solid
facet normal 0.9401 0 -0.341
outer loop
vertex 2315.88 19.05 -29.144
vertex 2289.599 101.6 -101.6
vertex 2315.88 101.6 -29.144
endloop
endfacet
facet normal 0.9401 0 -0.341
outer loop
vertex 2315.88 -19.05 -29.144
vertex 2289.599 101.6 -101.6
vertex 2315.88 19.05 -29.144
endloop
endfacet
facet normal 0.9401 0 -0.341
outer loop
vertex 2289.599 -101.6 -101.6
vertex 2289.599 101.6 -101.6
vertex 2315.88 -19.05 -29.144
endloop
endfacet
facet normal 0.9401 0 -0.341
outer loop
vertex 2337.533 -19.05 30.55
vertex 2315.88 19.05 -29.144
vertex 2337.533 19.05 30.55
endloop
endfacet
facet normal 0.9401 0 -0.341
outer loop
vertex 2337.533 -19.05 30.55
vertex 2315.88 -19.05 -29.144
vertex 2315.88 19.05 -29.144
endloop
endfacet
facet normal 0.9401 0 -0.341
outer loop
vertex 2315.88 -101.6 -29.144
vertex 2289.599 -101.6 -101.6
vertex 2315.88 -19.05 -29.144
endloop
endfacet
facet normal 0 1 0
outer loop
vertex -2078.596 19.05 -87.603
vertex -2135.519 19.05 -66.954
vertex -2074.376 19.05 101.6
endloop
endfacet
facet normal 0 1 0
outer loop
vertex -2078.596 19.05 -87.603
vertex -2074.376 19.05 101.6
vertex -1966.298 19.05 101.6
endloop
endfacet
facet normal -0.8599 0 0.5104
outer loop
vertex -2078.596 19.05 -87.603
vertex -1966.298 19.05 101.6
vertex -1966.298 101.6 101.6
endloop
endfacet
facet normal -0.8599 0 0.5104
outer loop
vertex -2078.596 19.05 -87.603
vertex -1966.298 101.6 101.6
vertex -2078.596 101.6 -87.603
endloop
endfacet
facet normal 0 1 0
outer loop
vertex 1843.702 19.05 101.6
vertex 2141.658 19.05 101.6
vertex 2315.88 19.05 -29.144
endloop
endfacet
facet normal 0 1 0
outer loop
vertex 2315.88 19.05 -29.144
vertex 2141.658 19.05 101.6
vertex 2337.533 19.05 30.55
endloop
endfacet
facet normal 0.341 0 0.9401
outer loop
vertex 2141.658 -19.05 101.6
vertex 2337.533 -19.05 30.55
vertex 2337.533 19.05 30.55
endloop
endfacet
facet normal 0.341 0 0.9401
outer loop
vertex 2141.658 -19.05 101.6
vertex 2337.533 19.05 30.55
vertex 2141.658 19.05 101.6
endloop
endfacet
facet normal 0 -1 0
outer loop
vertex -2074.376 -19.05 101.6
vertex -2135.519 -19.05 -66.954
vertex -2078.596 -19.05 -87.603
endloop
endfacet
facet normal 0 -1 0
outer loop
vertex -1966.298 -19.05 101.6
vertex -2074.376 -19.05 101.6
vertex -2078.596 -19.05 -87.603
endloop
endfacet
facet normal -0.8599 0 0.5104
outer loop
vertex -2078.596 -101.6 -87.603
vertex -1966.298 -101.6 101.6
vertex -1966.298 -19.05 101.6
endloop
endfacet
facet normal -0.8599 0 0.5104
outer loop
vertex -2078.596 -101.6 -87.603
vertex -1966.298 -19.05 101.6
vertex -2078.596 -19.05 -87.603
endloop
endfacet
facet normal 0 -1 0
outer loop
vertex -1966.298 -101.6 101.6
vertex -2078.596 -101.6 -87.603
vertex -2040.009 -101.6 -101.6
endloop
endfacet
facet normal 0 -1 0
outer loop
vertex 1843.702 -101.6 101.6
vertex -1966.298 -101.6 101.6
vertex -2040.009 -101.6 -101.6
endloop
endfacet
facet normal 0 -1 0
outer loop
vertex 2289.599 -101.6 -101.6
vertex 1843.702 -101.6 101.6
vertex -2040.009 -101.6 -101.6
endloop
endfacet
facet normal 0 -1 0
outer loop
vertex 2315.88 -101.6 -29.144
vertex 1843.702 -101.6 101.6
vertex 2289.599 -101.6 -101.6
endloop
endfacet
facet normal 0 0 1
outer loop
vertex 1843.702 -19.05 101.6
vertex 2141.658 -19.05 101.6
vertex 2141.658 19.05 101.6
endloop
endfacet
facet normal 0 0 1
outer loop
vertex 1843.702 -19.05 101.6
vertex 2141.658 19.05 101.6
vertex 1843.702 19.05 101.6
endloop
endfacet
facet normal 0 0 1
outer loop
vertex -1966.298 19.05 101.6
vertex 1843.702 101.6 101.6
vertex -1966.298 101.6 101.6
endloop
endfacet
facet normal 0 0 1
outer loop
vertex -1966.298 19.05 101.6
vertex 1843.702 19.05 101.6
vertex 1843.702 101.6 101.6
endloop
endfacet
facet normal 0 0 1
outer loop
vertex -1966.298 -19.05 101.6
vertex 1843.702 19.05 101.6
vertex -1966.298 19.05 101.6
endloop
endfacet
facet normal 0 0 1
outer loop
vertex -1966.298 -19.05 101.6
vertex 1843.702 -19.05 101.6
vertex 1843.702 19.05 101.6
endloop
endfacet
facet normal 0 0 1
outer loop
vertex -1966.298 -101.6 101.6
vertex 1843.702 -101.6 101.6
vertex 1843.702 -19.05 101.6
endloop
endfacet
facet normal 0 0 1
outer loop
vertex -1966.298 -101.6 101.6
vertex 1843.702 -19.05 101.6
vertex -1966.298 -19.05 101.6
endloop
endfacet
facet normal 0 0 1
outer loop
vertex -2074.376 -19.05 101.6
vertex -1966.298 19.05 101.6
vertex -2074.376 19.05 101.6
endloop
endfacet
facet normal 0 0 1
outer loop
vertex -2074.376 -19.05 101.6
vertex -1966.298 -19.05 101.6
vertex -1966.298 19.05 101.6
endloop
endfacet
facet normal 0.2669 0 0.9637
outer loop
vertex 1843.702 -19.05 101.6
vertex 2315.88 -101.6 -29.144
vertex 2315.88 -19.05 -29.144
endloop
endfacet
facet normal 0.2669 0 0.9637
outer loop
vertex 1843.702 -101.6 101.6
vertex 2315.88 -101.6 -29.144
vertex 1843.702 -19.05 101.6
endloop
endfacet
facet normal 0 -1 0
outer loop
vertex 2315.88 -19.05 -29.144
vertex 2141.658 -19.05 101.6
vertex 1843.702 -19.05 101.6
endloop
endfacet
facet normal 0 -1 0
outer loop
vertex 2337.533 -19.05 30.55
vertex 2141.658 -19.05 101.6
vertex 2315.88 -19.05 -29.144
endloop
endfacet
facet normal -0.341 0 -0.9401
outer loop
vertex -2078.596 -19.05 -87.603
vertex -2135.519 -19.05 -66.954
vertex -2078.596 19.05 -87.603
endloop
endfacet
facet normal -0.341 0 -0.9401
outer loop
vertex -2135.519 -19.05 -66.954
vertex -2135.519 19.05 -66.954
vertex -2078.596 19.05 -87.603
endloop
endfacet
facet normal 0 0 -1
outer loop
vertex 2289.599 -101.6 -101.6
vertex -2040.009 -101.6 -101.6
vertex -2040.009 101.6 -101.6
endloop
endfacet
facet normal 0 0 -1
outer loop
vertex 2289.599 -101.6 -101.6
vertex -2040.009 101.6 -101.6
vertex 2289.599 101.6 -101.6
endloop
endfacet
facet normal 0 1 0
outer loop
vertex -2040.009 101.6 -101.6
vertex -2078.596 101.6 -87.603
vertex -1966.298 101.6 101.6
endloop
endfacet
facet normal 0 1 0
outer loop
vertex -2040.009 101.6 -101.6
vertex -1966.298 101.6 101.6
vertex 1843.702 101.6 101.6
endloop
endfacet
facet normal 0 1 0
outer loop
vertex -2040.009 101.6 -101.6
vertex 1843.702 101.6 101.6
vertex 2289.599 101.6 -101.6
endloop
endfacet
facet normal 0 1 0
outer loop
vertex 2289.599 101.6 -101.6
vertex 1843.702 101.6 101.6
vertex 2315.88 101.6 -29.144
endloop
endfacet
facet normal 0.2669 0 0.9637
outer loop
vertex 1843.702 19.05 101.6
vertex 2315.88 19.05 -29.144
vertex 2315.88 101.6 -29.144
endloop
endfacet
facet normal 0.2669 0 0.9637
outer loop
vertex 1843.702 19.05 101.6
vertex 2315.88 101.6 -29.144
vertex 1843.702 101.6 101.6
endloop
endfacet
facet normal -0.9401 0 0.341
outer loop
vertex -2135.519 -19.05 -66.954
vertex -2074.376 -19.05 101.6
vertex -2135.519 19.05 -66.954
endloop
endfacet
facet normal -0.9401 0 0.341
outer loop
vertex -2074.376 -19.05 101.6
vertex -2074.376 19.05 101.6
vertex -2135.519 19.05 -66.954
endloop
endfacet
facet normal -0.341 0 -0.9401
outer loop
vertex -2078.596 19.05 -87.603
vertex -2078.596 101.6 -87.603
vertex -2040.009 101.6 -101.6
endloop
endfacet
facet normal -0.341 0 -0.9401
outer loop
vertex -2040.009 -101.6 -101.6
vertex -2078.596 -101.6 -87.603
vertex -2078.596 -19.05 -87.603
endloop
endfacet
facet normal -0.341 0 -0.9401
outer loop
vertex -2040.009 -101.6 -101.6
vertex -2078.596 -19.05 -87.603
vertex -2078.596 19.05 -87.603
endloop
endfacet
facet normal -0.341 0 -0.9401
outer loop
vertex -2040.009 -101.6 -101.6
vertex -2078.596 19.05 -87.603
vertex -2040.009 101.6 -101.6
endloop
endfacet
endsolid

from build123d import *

# Parameters (mm, degrees)
F1_DEPTH = 101.6
F2_DEPTH = 19.05


with BuildPart() as f1:
    # F0 (on Front) → F1 (new body, symmetric)
    with BuildSketch(Plane.XZ):
        Polygon((1843.7016355094, 101.6), (-1966.2983644906, 101.6), (-1966.2983644906, -101.6), (2289.5986355094, -101.6), (2302.8887772145, -64.9607405868), (1948.7385730094, 63.5), (1909.5294683228, 77.7223004984), align=None)
        Polygon((-1966.2983644906, -101.6), (-1966.2983644906, 101.6), (-2040.0091644906, -101.6), align=None)
        Polygon((-2040.0091644906, -101.6), (-1966.2983644906, 101.6), (-2078.5961114712, -87.6025849828), align=None)
        Polygon((2315.8804976416, -29.1441913344), (1981.2986825646, 63.5), (1948.7385730094, 63.5), (2302.8887772145, -64.9607405868), align=None)
        Polygon((1981.2986825646, 63.5), (1843.7016355094, 101.6), (1909.5294683228, 77.7223004984), (1948.7385730094, 63.5), align=None)
    extrude(amount=F1_DEPTH, both=True)

    # F0 (on Front) → F2 (join, symmetric)
    with BuildSketch(Plane.XZ):
        Polygon((-1966.2983644906, 101.6), (-2074.3764867409, 101.6), (-2135.519336069, -66.9536852599), (-2078.5961114712, -87.6025849828), align=None)
        Polygon((1981.2986825646, 63.5), (1843.7016355094, 101.6), (1909.5294683228, 77.7223004984), (1948.7385730094, 63.5), align=None)
        Polygon((1918.1906152742, 101.6), (1843.7016355094, 101.6), (1981.2986825646, 63.5), (2246.6944920684, 63.5), (2141.6575545684, 101.6), align=None)
        Polygon((2315.8804976416, -29.1441913344), (1981.2986825646, 63.5), (1948.7385730094, 63.5), (2302.8887772145, -64.9607405868), align=None)
        Polygon((2246.6944920684, 63.5), (1981.2986825646, 63.5), (2315.8804976416, -29.1441913344), (2337.53336502, 30.5500574195), align=None)
    extrude(amount=F2_DEPTH, both=True)


solid = f1.part
